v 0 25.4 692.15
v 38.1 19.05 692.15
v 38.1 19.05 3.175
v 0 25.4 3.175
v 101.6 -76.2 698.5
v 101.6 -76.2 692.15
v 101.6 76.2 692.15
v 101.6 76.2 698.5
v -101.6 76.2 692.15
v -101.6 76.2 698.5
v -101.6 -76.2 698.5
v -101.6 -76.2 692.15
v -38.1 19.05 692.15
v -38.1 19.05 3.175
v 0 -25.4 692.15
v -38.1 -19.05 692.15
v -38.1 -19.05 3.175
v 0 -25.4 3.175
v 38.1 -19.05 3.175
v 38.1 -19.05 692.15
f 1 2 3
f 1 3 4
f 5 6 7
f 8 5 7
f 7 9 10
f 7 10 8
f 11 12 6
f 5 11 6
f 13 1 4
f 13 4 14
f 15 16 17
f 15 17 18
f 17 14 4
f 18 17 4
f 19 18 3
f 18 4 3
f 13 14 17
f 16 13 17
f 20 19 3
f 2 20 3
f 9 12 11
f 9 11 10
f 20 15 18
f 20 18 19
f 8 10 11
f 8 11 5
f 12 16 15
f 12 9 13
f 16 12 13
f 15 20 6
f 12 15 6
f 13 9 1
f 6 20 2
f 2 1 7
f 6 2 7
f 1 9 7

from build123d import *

# Parameters (mm, degrees)
F1_DEPTH = 692.15
F2_W     = 203.2
F2_H     = 152.4
F3_DEPTH = 6.35
F4_DEPTH = 3.175


with BuildPart() as f1:
    # F0 (on Top) → F1 (new body)
    with BuildSketch(Plane.XY):
        Polygon((38.1, 19.05), (0, 25.4), (-38.1, 19.05), (-38.1, -19.05), (0, -25.4), (38.1, -19.05), align=None)
    extrude(amount=F1_DEPTH)

    # F2 (on face) → F3 (join)
    with BuildSketch(Plane.XY.offset(692.15)):
        Rectangle(F2_W, F2_H)
        Polygon((38.1, 19.05), (38.1, -19.05), (0, -25.4), (-38.1, -19.05), (-38.1, 19.05), (0, 25.4), align=None, mode=Mode.SUBTRACT)
        Polygon((0, -25.4), (38.1, -19.05), (38.1, 19.05), (0, 25.4), (-38.1, 19.05), (-38.1, -19.05), align=None)
    extrude(amount=F3_DEPTH)

    # F4 (cut): a face of the model
    f4_faces = [f1.faces().sort_by_distance(p)[0] for p in [
        (0, 0, 0),
    ]]
    extrude(f4_faces, amount=-F4_DEPTH, mode=Mode.SUBTRACT)


solid = f1.part
